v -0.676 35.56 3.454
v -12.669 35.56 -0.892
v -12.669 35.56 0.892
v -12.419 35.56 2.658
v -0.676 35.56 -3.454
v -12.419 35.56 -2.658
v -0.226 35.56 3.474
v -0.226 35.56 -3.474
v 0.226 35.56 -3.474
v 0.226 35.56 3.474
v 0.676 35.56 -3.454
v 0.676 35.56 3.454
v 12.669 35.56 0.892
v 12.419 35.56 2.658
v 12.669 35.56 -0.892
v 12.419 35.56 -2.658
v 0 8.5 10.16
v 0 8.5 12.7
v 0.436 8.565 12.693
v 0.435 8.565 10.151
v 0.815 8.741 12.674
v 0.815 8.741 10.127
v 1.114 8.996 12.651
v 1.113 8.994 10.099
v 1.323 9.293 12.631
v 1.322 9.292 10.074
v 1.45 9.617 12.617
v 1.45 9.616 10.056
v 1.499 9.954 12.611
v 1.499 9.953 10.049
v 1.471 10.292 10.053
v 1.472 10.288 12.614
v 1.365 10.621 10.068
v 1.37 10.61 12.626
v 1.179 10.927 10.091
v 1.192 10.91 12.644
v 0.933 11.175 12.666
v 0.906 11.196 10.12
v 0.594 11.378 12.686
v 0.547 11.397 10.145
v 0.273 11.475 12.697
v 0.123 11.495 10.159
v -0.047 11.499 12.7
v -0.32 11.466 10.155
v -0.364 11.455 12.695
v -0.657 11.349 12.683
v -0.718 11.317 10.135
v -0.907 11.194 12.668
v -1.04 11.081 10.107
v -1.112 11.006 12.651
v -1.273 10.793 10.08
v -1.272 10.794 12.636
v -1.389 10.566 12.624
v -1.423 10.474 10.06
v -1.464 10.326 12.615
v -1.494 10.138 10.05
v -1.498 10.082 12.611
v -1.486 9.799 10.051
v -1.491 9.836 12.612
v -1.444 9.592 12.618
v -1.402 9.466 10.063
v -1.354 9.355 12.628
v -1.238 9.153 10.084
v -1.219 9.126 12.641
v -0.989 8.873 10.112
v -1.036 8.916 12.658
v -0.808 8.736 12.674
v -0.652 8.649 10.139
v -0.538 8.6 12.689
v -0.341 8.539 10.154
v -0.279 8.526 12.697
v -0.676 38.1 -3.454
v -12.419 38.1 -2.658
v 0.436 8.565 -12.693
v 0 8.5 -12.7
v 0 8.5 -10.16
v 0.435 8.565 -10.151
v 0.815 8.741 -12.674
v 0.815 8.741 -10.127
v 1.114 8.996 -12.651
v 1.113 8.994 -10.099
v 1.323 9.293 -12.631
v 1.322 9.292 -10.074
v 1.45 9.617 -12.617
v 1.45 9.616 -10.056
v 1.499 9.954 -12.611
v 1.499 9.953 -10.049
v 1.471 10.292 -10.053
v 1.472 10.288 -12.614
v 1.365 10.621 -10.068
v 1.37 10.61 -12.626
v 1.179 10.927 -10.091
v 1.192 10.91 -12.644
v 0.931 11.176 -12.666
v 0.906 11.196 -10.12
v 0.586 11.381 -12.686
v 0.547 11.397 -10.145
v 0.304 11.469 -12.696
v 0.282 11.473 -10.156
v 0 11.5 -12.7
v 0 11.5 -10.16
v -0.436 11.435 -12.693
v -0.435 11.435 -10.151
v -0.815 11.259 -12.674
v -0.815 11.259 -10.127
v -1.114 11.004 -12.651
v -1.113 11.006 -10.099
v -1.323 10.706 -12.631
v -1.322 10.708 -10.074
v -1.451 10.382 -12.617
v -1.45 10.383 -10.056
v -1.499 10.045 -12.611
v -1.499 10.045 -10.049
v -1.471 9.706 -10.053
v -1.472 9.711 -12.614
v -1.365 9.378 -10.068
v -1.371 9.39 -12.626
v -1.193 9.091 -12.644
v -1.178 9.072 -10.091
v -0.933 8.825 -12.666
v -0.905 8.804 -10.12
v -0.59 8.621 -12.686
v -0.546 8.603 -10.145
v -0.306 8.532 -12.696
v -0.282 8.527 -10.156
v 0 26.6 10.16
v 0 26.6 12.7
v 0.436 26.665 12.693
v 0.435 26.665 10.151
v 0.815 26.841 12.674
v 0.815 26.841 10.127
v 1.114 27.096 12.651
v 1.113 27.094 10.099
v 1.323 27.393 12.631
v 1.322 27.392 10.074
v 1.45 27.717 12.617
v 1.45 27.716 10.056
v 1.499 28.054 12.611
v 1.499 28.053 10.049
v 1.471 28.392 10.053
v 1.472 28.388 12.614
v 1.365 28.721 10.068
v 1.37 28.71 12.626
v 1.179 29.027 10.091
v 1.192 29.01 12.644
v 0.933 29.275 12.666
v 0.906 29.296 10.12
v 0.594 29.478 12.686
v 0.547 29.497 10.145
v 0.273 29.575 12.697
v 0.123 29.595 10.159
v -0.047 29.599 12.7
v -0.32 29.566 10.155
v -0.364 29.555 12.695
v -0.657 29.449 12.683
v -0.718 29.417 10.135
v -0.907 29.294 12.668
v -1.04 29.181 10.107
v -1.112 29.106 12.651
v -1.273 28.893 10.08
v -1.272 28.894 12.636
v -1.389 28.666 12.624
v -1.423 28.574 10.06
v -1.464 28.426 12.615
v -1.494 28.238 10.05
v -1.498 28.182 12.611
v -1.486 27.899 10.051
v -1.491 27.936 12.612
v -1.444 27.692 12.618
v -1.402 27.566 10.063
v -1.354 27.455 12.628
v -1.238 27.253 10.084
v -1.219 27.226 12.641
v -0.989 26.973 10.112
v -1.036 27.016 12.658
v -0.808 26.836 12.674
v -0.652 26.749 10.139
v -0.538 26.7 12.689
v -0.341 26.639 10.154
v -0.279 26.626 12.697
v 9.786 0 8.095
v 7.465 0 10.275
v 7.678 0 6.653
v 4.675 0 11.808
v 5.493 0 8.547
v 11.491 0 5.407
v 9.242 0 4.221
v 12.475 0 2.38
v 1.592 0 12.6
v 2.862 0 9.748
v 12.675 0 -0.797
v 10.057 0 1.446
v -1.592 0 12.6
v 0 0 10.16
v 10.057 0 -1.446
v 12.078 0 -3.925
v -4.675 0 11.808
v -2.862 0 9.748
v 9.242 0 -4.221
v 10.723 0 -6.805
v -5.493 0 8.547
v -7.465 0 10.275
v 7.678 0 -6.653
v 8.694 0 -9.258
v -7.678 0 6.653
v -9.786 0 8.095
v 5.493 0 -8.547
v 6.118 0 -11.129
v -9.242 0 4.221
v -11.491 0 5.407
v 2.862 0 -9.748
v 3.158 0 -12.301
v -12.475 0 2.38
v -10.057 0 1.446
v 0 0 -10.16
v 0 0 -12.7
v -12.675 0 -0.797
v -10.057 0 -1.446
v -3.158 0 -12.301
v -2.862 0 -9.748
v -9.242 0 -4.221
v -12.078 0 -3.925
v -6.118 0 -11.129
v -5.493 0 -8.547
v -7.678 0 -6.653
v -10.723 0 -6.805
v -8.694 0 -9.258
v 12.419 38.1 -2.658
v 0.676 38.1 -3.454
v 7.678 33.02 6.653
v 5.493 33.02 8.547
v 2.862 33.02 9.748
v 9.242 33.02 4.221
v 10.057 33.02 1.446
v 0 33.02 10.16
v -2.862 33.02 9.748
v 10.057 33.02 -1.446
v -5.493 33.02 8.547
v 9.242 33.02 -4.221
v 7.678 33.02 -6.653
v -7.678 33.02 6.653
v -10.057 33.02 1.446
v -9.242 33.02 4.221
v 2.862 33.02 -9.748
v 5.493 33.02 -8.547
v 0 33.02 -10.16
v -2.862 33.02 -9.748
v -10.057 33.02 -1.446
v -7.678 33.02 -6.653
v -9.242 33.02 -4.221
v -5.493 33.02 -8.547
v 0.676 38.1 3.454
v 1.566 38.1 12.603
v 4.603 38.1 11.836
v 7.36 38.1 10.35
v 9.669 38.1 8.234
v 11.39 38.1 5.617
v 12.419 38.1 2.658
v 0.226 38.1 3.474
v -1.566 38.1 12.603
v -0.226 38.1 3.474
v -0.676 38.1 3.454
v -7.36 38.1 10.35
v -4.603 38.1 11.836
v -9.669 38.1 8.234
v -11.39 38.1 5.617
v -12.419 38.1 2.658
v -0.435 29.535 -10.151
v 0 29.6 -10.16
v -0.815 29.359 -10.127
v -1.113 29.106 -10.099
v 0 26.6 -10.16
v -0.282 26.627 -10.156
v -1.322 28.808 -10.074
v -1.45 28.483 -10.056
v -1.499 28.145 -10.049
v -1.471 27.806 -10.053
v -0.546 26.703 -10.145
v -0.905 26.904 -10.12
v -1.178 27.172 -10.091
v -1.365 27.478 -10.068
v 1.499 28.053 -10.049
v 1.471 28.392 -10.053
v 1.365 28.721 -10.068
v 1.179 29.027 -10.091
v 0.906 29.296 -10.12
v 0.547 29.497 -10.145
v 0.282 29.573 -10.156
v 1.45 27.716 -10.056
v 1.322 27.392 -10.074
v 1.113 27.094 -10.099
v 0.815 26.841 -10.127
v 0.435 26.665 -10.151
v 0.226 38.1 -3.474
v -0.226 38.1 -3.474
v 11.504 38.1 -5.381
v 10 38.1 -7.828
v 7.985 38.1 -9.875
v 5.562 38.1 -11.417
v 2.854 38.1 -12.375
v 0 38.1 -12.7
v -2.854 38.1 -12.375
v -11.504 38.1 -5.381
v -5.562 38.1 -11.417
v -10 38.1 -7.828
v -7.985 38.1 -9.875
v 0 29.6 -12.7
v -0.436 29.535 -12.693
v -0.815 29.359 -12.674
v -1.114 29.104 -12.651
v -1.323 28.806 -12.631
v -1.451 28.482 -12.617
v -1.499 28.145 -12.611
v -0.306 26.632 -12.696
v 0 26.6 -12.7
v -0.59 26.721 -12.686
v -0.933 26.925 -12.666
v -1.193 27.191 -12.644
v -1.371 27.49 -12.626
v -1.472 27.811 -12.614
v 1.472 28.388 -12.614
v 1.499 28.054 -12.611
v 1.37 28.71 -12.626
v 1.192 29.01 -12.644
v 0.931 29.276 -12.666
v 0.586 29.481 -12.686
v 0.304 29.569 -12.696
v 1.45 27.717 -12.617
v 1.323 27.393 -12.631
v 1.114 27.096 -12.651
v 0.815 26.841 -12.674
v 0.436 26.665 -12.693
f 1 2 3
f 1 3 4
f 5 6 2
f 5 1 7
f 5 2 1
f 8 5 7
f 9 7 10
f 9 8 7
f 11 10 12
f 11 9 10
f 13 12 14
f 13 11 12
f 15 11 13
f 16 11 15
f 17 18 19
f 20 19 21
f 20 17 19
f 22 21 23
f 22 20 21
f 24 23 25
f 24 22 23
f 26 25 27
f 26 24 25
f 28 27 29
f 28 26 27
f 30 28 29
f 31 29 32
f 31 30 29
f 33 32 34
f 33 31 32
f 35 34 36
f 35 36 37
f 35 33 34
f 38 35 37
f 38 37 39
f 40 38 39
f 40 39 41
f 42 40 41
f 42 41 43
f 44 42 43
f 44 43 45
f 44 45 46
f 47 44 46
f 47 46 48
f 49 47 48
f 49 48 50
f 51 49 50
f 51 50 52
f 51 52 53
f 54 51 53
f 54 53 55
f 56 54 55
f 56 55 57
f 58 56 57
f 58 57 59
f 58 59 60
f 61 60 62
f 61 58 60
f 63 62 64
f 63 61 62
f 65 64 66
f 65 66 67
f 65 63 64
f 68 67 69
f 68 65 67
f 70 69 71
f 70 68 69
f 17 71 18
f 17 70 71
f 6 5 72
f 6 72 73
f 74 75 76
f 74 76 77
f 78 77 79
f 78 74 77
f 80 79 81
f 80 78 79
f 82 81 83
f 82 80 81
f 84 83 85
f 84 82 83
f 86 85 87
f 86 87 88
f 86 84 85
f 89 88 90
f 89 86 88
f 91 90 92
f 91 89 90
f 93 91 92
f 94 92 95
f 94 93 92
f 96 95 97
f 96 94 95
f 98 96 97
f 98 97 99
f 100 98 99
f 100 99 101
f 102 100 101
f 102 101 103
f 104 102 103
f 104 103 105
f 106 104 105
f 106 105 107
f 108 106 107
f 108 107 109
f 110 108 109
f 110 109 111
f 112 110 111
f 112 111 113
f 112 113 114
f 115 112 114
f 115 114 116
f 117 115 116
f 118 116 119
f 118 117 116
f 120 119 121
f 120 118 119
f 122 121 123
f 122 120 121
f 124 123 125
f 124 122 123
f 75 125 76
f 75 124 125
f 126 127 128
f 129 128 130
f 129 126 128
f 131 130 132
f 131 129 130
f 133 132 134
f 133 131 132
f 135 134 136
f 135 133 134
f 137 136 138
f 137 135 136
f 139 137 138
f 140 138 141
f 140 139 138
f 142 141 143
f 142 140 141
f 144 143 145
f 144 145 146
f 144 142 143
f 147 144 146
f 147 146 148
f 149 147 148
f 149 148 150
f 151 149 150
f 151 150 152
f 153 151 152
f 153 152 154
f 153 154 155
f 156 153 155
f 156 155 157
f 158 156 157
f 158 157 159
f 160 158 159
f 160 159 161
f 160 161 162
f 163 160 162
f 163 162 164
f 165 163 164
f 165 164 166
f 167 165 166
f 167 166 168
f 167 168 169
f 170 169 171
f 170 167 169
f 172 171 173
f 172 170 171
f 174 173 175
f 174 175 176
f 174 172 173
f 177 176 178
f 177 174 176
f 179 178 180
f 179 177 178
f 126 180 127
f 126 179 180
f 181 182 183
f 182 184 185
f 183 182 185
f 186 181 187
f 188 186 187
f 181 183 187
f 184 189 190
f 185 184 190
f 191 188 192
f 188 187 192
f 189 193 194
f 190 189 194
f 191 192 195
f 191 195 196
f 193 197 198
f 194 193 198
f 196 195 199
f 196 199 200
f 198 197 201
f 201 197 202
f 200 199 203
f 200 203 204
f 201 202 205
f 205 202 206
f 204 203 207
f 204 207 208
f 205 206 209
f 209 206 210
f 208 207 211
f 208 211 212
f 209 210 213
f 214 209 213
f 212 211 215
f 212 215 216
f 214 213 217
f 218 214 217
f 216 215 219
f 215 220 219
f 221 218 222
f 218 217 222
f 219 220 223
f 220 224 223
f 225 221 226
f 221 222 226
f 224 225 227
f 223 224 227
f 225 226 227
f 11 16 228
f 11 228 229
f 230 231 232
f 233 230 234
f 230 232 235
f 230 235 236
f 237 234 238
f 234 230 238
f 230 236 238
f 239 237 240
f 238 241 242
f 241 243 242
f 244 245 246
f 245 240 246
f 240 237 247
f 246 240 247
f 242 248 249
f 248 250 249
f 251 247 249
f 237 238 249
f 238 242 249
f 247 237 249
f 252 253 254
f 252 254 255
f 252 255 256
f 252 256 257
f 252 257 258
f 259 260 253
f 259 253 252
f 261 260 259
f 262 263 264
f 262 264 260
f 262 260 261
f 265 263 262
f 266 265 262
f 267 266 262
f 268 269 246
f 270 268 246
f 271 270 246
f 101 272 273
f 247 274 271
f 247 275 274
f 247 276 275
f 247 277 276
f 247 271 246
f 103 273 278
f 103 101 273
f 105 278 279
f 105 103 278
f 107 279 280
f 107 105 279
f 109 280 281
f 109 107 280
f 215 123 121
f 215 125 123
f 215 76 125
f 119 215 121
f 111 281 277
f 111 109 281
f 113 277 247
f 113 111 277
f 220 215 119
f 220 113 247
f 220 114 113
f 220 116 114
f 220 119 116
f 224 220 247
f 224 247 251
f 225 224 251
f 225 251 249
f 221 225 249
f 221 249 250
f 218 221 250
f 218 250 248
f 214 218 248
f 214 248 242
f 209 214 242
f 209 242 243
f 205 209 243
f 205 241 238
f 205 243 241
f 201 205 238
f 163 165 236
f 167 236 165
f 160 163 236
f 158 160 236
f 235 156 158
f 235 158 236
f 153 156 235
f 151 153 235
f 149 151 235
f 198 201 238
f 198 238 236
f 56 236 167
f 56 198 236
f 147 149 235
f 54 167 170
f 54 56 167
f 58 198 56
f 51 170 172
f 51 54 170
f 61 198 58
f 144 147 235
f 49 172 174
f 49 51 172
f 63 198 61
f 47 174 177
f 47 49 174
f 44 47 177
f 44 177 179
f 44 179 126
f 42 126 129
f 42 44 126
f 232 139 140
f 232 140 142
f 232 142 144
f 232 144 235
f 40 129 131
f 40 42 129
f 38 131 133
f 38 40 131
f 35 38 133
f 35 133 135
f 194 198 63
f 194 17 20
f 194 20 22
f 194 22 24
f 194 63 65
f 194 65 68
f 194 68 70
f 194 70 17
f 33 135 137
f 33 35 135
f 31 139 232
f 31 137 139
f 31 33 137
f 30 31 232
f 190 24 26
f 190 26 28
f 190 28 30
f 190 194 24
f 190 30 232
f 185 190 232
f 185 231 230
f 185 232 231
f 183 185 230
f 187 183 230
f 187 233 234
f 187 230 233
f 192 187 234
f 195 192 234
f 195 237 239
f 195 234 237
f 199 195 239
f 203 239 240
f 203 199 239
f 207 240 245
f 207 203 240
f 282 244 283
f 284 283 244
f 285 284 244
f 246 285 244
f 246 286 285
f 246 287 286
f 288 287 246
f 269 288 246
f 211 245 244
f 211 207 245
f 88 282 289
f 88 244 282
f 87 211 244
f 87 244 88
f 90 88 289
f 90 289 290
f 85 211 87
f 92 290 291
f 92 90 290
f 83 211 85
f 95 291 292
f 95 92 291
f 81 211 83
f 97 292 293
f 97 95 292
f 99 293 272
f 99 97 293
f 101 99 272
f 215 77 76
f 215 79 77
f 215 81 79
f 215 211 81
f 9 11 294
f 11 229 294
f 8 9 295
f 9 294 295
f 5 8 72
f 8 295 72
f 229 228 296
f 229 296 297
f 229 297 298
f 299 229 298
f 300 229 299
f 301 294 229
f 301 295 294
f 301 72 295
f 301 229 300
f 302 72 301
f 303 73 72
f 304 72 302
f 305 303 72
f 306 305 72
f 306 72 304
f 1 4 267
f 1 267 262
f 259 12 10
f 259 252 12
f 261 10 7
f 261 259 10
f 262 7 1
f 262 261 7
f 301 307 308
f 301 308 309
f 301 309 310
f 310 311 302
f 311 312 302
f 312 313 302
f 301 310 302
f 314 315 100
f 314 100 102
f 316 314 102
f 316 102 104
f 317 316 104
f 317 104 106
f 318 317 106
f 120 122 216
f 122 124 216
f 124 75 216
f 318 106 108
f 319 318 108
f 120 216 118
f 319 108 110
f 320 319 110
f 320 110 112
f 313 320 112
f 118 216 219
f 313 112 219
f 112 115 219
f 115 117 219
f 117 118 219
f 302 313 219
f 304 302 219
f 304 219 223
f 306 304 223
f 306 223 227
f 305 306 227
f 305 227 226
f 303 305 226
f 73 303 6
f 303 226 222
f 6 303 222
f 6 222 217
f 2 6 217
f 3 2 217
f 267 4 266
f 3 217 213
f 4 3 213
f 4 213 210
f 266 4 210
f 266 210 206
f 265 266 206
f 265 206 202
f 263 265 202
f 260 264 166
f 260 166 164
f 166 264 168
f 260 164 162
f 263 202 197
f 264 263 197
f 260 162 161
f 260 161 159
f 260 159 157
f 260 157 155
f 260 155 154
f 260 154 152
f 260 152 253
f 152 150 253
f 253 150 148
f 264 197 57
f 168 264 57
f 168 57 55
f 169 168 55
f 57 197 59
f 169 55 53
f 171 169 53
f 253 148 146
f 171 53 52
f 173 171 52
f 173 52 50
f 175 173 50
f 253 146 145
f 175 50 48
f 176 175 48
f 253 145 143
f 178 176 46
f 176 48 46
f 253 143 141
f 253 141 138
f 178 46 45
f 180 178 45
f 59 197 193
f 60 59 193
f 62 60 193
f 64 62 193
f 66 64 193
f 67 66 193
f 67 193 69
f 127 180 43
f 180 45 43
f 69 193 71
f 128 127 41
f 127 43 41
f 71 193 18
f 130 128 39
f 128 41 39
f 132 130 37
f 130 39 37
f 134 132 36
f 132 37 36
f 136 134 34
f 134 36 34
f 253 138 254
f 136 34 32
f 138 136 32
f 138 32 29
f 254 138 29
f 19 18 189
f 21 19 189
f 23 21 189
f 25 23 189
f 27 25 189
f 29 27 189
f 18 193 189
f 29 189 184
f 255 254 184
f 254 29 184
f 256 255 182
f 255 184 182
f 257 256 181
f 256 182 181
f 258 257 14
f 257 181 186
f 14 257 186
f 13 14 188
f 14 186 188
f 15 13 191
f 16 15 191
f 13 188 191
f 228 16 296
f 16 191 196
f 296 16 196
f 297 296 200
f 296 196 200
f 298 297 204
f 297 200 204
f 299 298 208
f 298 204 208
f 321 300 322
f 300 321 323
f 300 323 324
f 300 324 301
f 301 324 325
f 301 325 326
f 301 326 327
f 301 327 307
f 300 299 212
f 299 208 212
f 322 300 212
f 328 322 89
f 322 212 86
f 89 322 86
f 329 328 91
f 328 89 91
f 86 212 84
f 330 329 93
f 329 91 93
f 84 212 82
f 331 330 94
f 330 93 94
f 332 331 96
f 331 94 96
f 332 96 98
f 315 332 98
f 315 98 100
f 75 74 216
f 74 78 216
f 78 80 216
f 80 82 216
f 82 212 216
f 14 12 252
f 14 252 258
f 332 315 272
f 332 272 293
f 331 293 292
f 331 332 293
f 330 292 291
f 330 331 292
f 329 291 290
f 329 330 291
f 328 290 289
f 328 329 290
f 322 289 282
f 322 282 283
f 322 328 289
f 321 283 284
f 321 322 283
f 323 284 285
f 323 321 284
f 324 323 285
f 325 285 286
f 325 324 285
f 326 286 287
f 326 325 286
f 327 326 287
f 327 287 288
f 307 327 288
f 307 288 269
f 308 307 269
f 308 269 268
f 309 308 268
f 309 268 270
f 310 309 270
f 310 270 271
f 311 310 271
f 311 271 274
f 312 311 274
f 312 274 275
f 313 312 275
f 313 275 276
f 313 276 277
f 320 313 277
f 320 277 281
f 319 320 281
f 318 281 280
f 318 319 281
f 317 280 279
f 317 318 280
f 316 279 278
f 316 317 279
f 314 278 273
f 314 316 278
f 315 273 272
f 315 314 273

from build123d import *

# Parameters (mm, degrees)
SKETCH1_R               = 12.7
SKETCH1_R_2             = 10.16
BOSS_EXTRUDE1_DEPTH     = 38.1
BOSS_EXTRUDE2_START     = -5.08
SKETCH2_R               = 12.7
BOSS_EXTRUDE2_DEPTH     = 5.08
CUT_EXTRUDE1_START      = -2.54
CUT_EXTRUDE1_DEPTH      = 2.54
FILLET1_R               = 10
CUT_EXTRUDE2_DEPTH      = 48.519048812
CUT_EXTRUDE2_DEPTH_BACK = 48.519048812
SKETCH5_R               = 1.5


with BuildPart() as part:
    # Sketch1 → Boss-Extrude1 (new body)
    with BuildSketch(Plane(origin=(0, 0, 0), x_dir=(1, 0, 0), z_dir=(0, 1, 0))):
        with Locations(Location((0, 0, 0), (0, 0, 90))):
            Circle(SKETCH1_R)
        with Locations(Location((0, 0, 0), (0, 0, 90))):
            Circle(SKETCH1_R_2, mode=Mode.SUBTRACT)
    extrude(amount=BOSS_EXTRUDE1_DEPTH)

    # Sketch2 → Boss-Extrude2 (add)
    with BuildSketch(Plane(origin=(0, 38.1, 0), x_dir=(1, 0, 0), z_dir=(0, 1, 0)).offset(BOSS_EXTRUDE2_START)):
        with Locations(Location((0, 0, 0), (0, 0, 90))):
            Circle(SKETCH2_R)
    extrude(amount=BOSS_EXTRUDE2_DEPTH)

    # Sketch3 → Cut-Extrude1 (cut)
    with BuildSketch(Plane(origin=(0, 38.1, 0), x_dir=(1, 0, 0), z_dir=(0, 1, 0)).offset(CUT_EXTRUDE1_START)):
        with BuildLine():
            Line((0, 3.5), (-12.418726065, 2.65805247))
            ThreePointArc((-12.418726065, 2.65805247), (-12.7, 0), (-12.418726065, -2.65805247))
            Line((-12.418726065, -2.65805247), (0, -3.5))
            Line((0, -3.5), (12.418726065, -2.65805247))
            ThreePointArc((12.418726065, -2.65805247), (12.7, 0), (12.418726065, 2.65805247))
            Line((12.418726065, 2.65805247), (0, 3.5))
        make_face()
    extrude(amount=CUT_EXTRUDE1_DEPTH, mode=Mode.SUBTRACT)

    # Fillet1
    fillet1_edges = [part.edges().sort_by_distance(p)[0] for p in [
        (0, 36.83, 3.5),
        (0, 36.83, -3.5),
    ]]
    fillet(fillet1_edges, radius=FILLET1_R)

    # Sketch5 → Cut-Extrude2 (cut, two sides: drawn at the far end of the back side and taken through both)
    with BuildSketch(Plane.XY.offset(-12.7).offset(-CUT_EXTRUDE2_DEPTH_BACK)):
        with Locations(Location((0, 28.1, 0), (0, 0, 270.000000018))):
            Circle(SKETCH5_R)
        with Locations(Location((0, 10, 0), (0, 0, 270.000000018))):
            Circle(SKETCH5_R)
    extrude(amount=CUT_EXTRUDE2_DEPTH + CUT_EXTRUDE2_DEPTH_BACK, mode=Mode.SUBTRACT)


solid = part.part
